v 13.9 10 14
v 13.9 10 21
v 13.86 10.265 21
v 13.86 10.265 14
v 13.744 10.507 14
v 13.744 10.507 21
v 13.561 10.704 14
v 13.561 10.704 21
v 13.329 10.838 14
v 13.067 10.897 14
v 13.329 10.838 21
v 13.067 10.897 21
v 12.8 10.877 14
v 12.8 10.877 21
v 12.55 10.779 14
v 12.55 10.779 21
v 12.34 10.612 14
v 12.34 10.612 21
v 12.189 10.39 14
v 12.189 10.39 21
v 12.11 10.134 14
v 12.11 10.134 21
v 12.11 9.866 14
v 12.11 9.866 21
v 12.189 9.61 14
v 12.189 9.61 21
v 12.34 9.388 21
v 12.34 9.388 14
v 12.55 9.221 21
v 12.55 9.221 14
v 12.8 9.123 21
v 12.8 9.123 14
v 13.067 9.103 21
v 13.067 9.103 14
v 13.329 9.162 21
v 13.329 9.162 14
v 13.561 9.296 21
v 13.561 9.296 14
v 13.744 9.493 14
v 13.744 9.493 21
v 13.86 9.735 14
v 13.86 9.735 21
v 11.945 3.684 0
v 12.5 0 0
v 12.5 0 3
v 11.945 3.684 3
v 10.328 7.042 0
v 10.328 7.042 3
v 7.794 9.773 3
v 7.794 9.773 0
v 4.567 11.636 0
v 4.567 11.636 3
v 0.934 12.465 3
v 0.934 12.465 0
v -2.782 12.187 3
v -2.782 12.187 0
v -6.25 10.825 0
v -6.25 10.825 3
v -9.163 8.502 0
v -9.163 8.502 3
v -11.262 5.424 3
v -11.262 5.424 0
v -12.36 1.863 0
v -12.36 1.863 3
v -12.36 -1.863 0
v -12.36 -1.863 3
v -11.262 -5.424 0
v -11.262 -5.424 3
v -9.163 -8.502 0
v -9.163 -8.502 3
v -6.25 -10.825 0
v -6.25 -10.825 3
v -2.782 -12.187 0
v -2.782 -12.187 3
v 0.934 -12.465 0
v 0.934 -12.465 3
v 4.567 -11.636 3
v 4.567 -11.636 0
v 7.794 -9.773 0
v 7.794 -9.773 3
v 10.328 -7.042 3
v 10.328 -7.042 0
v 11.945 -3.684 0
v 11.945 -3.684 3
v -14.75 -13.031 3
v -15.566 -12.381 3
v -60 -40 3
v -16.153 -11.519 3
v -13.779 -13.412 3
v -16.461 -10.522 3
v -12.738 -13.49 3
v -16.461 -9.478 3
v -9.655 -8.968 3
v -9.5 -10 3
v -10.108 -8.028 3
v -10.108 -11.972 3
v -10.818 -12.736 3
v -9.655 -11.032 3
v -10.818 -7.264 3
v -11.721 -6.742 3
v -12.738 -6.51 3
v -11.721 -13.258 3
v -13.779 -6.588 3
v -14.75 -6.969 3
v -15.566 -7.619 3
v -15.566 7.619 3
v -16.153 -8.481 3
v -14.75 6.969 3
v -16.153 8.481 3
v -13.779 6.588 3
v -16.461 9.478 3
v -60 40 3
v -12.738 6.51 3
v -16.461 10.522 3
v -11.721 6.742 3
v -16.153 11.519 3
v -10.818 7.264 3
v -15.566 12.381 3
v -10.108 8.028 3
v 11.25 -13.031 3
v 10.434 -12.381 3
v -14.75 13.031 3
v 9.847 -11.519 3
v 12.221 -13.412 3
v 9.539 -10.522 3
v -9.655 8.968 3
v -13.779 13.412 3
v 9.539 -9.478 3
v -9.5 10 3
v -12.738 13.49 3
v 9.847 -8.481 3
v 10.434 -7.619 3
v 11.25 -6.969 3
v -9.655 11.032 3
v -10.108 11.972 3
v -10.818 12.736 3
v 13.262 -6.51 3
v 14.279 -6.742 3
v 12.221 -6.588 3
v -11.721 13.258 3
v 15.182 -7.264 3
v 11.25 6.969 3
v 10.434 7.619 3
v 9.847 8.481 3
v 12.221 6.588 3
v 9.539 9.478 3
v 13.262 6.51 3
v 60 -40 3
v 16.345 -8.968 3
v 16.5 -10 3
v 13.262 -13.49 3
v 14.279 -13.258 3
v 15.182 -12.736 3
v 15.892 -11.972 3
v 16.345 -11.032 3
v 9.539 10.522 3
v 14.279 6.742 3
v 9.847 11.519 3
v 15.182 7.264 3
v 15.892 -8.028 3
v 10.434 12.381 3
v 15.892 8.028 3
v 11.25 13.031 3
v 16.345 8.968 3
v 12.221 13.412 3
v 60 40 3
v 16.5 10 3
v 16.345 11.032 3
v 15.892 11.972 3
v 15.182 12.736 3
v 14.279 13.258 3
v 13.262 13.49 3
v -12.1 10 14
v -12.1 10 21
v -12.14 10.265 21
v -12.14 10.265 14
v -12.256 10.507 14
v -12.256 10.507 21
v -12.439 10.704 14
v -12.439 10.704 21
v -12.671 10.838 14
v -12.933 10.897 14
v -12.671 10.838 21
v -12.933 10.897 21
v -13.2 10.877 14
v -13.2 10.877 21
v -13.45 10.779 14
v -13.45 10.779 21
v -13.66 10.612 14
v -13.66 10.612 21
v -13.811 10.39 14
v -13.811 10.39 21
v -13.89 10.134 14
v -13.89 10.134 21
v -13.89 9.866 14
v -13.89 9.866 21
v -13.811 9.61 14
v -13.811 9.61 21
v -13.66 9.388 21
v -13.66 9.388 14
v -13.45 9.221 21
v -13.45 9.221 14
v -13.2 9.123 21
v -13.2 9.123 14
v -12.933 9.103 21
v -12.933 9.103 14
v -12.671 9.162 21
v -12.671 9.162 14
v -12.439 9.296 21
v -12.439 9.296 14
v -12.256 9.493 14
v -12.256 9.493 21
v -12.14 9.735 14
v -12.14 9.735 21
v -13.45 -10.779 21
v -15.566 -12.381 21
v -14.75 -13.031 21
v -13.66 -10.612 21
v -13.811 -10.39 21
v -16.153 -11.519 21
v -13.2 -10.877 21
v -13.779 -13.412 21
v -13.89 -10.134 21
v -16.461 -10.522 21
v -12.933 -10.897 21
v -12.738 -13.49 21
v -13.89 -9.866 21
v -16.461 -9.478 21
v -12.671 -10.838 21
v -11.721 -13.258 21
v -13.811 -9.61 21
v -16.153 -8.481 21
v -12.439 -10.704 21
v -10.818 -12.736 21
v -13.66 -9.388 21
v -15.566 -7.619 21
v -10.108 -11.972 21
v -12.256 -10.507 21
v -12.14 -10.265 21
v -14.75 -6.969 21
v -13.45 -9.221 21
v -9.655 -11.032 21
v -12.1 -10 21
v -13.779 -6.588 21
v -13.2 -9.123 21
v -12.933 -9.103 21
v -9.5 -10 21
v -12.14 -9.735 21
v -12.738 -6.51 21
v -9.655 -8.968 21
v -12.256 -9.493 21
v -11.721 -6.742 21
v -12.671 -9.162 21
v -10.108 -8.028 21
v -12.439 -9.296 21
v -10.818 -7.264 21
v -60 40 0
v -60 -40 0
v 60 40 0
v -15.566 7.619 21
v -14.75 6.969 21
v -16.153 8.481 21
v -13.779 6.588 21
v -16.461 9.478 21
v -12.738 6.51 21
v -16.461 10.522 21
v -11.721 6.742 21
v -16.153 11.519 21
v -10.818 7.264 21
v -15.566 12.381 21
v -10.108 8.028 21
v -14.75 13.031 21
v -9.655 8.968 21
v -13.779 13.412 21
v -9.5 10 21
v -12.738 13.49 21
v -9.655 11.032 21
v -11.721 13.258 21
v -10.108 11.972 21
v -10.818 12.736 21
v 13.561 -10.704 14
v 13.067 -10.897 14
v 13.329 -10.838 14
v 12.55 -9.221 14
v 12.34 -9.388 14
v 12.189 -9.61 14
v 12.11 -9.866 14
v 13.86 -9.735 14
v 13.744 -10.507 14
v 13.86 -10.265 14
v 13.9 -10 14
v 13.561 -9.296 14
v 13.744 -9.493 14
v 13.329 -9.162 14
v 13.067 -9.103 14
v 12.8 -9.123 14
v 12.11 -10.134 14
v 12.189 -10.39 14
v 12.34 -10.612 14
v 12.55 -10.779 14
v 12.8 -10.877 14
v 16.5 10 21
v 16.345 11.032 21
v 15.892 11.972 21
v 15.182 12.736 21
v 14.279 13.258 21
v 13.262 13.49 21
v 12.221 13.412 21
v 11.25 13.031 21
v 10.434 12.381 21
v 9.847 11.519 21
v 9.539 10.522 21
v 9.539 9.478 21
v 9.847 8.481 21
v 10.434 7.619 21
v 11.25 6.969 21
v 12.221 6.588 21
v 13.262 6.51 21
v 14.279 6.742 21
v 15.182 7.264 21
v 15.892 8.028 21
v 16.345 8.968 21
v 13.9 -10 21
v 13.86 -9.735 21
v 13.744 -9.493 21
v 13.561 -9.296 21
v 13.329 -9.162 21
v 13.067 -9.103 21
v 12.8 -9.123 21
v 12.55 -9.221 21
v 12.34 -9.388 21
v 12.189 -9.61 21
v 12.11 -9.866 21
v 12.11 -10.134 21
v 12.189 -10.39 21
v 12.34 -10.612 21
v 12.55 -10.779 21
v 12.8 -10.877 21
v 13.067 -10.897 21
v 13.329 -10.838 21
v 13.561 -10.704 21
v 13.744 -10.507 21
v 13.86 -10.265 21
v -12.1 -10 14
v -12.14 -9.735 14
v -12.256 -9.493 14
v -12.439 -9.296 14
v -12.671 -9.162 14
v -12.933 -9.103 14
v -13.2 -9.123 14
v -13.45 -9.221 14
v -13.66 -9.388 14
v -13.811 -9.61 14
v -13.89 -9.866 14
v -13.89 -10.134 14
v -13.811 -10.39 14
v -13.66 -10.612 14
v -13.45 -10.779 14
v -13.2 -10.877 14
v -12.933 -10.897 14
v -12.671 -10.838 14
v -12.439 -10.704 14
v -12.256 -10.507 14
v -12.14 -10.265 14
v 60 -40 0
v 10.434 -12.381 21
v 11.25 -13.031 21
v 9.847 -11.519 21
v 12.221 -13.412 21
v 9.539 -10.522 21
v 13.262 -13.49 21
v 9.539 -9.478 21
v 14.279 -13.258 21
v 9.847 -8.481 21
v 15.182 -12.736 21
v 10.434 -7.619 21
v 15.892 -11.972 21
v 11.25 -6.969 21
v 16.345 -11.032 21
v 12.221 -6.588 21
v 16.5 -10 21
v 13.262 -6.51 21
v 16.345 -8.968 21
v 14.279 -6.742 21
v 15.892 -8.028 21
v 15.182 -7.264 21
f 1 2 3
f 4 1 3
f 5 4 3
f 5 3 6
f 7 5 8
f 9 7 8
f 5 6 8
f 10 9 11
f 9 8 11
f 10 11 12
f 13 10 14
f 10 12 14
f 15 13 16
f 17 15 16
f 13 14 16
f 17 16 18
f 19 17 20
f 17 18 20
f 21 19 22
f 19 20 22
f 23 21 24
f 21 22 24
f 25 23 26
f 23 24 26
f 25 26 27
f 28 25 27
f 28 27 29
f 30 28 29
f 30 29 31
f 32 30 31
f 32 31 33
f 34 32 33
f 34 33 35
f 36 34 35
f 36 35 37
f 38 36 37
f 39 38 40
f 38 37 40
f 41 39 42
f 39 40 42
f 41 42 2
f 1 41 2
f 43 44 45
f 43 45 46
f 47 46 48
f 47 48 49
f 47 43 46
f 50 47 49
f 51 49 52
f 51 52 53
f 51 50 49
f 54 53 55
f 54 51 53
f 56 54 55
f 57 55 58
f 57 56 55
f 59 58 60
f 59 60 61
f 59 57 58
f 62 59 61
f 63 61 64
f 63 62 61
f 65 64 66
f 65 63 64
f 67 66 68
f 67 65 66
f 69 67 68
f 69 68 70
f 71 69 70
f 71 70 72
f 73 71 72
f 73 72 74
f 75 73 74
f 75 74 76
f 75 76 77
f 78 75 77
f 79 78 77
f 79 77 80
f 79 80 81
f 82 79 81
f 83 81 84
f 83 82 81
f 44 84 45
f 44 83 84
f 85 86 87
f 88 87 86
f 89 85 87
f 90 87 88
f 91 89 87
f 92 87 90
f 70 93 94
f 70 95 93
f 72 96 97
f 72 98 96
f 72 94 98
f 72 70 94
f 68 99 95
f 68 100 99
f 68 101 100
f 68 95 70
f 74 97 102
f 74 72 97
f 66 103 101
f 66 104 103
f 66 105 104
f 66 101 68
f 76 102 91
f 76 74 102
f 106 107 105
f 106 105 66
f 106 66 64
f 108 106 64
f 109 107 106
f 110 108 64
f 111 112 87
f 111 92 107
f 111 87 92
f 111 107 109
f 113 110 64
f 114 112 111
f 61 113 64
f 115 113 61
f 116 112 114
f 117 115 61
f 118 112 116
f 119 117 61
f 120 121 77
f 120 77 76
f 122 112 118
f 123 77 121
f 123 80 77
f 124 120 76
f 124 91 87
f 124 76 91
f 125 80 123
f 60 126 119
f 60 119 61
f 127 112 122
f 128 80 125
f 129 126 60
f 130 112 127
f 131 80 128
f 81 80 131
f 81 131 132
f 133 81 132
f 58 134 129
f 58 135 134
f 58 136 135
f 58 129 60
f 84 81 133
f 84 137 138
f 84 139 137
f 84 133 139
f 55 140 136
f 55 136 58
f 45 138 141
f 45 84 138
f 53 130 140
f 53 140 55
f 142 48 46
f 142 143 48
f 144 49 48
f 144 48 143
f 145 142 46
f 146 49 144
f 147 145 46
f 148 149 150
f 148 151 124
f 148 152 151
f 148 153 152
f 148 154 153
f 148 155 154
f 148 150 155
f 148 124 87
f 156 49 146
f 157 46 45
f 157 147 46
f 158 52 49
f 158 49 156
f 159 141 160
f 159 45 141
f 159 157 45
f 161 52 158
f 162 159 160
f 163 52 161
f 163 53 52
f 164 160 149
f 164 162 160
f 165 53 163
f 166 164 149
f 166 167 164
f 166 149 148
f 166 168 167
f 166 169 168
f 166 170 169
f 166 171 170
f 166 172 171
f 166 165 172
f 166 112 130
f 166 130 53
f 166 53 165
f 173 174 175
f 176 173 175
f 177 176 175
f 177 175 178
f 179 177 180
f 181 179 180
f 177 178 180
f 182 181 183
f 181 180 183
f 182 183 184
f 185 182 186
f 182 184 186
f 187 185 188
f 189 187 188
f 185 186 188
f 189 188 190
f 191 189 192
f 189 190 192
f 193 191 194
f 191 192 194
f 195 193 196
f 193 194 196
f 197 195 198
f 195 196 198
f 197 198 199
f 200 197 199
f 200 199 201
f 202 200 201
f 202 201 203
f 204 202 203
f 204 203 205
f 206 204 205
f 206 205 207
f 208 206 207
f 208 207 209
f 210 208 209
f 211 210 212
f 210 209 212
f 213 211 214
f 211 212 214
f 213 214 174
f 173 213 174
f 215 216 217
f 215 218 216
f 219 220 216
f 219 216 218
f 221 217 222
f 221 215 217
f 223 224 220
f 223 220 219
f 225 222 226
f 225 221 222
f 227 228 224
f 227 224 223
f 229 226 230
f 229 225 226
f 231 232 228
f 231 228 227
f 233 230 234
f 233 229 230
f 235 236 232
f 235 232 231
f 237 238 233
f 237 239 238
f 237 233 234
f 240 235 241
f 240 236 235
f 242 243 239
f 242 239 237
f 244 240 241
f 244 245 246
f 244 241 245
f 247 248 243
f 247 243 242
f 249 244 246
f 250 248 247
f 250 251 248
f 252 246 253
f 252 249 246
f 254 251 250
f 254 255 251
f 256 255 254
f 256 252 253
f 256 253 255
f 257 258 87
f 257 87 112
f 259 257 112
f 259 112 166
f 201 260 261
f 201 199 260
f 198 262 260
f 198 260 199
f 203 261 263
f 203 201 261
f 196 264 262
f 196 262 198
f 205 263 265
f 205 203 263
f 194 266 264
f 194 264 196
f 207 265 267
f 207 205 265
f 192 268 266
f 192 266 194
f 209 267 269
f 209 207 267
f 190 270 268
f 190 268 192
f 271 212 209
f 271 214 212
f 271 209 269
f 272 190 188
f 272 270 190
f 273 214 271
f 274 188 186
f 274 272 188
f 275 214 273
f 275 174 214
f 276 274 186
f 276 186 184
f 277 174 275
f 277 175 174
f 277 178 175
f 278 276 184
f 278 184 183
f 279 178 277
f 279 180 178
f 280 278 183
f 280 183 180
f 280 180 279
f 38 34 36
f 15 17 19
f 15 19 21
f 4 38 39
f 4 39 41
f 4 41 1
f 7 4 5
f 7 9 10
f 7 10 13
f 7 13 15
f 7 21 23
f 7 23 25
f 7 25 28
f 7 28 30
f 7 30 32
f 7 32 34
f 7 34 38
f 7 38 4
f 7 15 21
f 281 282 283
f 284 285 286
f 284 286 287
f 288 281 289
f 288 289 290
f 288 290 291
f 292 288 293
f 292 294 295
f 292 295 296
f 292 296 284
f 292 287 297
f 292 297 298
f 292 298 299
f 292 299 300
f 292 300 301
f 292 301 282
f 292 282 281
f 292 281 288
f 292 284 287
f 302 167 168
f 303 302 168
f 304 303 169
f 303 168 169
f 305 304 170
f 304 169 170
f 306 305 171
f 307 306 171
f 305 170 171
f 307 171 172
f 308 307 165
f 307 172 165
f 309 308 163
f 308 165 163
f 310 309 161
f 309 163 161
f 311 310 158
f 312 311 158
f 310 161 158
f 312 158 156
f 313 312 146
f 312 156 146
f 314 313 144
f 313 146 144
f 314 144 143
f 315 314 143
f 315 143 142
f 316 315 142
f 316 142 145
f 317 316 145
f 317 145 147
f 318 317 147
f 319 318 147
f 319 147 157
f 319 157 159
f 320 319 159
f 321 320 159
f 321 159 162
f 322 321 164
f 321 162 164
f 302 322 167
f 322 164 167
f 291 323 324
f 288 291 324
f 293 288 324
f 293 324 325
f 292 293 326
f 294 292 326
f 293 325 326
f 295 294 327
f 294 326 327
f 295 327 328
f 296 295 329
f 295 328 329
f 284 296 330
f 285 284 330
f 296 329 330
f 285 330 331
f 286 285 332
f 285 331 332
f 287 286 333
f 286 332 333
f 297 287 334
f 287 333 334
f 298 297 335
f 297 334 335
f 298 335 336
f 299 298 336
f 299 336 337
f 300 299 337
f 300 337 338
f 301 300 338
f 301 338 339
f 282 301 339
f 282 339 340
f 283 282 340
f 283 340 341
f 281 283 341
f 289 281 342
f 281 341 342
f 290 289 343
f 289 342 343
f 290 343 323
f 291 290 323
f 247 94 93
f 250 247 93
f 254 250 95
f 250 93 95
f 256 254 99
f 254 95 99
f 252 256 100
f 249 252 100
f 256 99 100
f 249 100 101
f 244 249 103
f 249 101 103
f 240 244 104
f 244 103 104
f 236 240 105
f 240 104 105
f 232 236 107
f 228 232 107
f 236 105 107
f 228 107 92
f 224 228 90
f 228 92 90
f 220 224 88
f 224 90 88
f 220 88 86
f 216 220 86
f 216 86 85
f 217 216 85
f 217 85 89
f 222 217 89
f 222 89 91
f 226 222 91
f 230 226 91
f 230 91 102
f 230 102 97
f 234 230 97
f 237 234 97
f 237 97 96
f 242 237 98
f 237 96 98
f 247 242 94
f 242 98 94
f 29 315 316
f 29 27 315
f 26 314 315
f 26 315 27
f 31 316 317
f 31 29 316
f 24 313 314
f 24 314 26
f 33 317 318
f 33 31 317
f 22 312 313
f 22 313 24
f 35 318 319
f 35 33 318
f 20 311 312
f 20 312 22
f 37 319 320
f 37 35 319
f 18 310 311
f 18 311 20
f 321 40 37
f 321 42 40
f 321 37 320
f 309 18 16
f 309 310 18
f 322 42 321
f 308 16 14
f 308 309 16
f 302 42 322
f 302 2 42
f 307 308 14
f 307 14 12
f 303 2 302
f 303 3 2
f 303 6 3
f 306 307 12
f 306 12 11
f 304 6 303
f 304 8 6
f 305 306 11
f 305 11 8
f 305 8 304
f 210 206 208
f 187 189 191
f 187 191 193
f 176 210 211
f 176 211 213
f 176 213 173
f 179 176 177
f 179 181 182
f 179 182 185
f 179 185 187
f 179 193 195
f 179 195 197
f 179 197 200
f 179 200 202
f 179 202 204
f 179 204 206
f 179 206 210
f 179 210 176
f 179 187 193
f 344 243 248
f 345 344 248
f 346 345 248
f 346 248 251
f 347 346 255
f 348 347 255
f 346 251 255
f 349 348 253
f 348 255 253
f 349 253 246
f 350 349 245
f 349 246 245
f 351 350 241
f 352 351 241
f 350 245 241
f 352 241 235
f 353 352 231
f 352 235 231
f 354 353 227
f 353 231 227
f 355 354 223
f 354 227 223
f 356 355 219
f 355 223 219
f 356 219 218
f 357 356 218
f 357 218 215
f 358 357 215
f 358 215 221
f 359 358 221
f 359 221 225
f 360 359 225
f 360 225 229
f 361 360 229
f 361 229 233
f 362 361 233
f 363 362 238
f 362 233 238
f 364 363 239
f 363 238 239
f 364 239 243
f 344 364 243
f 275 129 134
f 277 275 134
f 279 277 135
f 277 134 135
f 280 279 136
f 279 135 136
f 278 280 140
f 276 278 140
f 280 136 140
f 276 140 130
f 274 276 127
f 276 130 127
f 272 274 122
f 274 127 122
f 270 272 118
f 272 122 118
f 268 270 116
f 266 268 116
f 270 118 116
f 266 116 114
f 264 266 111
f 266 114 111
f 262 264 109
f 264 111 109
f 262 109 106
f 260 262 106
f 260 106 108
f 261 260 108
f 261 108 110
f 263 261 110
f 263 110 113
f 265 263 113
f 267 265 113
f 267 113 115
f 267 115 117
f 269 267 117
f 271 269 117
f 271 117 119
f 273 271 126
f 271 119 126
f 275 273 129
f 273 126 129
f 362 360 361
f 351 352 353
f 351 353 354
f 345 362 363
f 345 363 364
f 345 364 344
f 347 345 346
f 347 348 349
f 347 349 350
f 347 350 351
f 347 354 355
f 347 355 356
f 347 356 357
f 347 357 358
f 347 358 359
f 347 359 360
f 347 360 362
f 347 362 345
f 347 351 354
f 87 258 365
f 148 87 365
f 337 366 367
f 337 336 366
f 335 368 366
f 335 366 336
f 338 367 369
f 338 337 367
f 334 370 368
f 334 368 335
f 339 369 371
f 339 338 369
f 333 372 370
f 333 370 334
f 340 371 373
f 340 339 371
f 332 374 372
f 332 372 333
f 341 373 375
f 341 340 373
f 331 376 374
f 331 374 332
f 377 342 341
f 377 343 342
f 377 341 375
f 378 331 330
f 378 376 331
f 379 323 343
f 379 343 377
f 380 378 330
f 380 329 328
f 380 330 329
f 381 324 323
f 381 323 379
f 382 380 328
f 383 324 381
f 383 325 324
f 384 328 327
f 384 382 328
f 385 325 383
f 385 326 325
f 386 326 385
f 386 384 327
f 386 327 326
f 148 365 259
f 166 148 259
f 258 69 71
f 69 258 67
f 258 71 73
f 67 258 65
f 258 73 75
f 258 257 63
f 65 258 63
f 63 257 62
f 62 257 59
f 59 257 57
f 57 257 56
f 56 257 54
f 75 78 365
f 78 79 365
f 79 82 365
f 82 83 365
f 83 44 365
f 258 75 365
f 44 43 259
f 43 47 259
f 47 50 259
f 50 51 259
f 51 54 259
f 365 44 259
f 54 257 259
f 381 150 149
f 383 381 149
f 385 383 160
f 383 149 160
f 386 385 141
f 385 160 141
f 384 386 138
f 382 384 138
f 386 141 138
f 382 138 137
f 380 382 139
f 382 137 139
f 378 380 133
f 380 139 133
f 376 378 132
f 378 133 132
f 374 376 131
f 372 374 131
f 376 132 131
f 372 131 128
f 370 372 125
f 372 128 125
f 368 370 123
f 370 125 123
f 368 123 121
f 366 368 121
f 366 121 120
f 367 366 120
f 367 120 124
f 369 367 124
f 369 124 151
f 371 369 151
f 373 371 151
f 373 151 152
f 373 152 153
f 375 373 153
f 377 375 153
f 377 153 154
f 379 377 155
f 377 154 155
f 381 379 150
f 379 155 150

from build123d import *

# Parameters (mm, degrees)
F0_W     = 120
F0_H     = 80
F0_R     = 12.5
F1_DEPTH = 3
F2_R     = 3.5
F3_DEPTH = 18
F4_R     = 0.9
F5_DEPTH = 7


with BuildPart() as f1:
    # F0 (on Top) → F1 (new body)
    with BuildSketch(Plane.XY):
        Rectangle(F0_W, F0_H)
        Circle(F0_R, mode=Mode.SUBTRACT)
    extrude(amount=F1_DEPTH)

    # F2 (on face) → F3 (join)
    with BuildSketch(Plane.XY.offset(3)):
        with Locations((-13, 10)):
            Circle(F2_R)
        with Locations((13, 10)):
            Circle(F2_R)
        with Locations((13, -10)):
            Circle(F2_R)
        with Locations((-13, -10)):
            Circle(F2_R)
    extrude(amount=F3_DEPTH)

    # F4 (on face) → F5 (cut)
    with BuildSketch(Plane.XY.offset(21)):
        with Locations((-13, 10)):
            Circle(F4_R)
        with Locations((13, 10)):
            Circle(F4_R)
        with Locations((13, -10)):
            Circle(F4_R)
        with Locations((-13, -10)):
            Circle(F4_R)
    extrude(amount=-F5_DEPTH, mode=Mode.SUBTRACT)


solid = f1.part
